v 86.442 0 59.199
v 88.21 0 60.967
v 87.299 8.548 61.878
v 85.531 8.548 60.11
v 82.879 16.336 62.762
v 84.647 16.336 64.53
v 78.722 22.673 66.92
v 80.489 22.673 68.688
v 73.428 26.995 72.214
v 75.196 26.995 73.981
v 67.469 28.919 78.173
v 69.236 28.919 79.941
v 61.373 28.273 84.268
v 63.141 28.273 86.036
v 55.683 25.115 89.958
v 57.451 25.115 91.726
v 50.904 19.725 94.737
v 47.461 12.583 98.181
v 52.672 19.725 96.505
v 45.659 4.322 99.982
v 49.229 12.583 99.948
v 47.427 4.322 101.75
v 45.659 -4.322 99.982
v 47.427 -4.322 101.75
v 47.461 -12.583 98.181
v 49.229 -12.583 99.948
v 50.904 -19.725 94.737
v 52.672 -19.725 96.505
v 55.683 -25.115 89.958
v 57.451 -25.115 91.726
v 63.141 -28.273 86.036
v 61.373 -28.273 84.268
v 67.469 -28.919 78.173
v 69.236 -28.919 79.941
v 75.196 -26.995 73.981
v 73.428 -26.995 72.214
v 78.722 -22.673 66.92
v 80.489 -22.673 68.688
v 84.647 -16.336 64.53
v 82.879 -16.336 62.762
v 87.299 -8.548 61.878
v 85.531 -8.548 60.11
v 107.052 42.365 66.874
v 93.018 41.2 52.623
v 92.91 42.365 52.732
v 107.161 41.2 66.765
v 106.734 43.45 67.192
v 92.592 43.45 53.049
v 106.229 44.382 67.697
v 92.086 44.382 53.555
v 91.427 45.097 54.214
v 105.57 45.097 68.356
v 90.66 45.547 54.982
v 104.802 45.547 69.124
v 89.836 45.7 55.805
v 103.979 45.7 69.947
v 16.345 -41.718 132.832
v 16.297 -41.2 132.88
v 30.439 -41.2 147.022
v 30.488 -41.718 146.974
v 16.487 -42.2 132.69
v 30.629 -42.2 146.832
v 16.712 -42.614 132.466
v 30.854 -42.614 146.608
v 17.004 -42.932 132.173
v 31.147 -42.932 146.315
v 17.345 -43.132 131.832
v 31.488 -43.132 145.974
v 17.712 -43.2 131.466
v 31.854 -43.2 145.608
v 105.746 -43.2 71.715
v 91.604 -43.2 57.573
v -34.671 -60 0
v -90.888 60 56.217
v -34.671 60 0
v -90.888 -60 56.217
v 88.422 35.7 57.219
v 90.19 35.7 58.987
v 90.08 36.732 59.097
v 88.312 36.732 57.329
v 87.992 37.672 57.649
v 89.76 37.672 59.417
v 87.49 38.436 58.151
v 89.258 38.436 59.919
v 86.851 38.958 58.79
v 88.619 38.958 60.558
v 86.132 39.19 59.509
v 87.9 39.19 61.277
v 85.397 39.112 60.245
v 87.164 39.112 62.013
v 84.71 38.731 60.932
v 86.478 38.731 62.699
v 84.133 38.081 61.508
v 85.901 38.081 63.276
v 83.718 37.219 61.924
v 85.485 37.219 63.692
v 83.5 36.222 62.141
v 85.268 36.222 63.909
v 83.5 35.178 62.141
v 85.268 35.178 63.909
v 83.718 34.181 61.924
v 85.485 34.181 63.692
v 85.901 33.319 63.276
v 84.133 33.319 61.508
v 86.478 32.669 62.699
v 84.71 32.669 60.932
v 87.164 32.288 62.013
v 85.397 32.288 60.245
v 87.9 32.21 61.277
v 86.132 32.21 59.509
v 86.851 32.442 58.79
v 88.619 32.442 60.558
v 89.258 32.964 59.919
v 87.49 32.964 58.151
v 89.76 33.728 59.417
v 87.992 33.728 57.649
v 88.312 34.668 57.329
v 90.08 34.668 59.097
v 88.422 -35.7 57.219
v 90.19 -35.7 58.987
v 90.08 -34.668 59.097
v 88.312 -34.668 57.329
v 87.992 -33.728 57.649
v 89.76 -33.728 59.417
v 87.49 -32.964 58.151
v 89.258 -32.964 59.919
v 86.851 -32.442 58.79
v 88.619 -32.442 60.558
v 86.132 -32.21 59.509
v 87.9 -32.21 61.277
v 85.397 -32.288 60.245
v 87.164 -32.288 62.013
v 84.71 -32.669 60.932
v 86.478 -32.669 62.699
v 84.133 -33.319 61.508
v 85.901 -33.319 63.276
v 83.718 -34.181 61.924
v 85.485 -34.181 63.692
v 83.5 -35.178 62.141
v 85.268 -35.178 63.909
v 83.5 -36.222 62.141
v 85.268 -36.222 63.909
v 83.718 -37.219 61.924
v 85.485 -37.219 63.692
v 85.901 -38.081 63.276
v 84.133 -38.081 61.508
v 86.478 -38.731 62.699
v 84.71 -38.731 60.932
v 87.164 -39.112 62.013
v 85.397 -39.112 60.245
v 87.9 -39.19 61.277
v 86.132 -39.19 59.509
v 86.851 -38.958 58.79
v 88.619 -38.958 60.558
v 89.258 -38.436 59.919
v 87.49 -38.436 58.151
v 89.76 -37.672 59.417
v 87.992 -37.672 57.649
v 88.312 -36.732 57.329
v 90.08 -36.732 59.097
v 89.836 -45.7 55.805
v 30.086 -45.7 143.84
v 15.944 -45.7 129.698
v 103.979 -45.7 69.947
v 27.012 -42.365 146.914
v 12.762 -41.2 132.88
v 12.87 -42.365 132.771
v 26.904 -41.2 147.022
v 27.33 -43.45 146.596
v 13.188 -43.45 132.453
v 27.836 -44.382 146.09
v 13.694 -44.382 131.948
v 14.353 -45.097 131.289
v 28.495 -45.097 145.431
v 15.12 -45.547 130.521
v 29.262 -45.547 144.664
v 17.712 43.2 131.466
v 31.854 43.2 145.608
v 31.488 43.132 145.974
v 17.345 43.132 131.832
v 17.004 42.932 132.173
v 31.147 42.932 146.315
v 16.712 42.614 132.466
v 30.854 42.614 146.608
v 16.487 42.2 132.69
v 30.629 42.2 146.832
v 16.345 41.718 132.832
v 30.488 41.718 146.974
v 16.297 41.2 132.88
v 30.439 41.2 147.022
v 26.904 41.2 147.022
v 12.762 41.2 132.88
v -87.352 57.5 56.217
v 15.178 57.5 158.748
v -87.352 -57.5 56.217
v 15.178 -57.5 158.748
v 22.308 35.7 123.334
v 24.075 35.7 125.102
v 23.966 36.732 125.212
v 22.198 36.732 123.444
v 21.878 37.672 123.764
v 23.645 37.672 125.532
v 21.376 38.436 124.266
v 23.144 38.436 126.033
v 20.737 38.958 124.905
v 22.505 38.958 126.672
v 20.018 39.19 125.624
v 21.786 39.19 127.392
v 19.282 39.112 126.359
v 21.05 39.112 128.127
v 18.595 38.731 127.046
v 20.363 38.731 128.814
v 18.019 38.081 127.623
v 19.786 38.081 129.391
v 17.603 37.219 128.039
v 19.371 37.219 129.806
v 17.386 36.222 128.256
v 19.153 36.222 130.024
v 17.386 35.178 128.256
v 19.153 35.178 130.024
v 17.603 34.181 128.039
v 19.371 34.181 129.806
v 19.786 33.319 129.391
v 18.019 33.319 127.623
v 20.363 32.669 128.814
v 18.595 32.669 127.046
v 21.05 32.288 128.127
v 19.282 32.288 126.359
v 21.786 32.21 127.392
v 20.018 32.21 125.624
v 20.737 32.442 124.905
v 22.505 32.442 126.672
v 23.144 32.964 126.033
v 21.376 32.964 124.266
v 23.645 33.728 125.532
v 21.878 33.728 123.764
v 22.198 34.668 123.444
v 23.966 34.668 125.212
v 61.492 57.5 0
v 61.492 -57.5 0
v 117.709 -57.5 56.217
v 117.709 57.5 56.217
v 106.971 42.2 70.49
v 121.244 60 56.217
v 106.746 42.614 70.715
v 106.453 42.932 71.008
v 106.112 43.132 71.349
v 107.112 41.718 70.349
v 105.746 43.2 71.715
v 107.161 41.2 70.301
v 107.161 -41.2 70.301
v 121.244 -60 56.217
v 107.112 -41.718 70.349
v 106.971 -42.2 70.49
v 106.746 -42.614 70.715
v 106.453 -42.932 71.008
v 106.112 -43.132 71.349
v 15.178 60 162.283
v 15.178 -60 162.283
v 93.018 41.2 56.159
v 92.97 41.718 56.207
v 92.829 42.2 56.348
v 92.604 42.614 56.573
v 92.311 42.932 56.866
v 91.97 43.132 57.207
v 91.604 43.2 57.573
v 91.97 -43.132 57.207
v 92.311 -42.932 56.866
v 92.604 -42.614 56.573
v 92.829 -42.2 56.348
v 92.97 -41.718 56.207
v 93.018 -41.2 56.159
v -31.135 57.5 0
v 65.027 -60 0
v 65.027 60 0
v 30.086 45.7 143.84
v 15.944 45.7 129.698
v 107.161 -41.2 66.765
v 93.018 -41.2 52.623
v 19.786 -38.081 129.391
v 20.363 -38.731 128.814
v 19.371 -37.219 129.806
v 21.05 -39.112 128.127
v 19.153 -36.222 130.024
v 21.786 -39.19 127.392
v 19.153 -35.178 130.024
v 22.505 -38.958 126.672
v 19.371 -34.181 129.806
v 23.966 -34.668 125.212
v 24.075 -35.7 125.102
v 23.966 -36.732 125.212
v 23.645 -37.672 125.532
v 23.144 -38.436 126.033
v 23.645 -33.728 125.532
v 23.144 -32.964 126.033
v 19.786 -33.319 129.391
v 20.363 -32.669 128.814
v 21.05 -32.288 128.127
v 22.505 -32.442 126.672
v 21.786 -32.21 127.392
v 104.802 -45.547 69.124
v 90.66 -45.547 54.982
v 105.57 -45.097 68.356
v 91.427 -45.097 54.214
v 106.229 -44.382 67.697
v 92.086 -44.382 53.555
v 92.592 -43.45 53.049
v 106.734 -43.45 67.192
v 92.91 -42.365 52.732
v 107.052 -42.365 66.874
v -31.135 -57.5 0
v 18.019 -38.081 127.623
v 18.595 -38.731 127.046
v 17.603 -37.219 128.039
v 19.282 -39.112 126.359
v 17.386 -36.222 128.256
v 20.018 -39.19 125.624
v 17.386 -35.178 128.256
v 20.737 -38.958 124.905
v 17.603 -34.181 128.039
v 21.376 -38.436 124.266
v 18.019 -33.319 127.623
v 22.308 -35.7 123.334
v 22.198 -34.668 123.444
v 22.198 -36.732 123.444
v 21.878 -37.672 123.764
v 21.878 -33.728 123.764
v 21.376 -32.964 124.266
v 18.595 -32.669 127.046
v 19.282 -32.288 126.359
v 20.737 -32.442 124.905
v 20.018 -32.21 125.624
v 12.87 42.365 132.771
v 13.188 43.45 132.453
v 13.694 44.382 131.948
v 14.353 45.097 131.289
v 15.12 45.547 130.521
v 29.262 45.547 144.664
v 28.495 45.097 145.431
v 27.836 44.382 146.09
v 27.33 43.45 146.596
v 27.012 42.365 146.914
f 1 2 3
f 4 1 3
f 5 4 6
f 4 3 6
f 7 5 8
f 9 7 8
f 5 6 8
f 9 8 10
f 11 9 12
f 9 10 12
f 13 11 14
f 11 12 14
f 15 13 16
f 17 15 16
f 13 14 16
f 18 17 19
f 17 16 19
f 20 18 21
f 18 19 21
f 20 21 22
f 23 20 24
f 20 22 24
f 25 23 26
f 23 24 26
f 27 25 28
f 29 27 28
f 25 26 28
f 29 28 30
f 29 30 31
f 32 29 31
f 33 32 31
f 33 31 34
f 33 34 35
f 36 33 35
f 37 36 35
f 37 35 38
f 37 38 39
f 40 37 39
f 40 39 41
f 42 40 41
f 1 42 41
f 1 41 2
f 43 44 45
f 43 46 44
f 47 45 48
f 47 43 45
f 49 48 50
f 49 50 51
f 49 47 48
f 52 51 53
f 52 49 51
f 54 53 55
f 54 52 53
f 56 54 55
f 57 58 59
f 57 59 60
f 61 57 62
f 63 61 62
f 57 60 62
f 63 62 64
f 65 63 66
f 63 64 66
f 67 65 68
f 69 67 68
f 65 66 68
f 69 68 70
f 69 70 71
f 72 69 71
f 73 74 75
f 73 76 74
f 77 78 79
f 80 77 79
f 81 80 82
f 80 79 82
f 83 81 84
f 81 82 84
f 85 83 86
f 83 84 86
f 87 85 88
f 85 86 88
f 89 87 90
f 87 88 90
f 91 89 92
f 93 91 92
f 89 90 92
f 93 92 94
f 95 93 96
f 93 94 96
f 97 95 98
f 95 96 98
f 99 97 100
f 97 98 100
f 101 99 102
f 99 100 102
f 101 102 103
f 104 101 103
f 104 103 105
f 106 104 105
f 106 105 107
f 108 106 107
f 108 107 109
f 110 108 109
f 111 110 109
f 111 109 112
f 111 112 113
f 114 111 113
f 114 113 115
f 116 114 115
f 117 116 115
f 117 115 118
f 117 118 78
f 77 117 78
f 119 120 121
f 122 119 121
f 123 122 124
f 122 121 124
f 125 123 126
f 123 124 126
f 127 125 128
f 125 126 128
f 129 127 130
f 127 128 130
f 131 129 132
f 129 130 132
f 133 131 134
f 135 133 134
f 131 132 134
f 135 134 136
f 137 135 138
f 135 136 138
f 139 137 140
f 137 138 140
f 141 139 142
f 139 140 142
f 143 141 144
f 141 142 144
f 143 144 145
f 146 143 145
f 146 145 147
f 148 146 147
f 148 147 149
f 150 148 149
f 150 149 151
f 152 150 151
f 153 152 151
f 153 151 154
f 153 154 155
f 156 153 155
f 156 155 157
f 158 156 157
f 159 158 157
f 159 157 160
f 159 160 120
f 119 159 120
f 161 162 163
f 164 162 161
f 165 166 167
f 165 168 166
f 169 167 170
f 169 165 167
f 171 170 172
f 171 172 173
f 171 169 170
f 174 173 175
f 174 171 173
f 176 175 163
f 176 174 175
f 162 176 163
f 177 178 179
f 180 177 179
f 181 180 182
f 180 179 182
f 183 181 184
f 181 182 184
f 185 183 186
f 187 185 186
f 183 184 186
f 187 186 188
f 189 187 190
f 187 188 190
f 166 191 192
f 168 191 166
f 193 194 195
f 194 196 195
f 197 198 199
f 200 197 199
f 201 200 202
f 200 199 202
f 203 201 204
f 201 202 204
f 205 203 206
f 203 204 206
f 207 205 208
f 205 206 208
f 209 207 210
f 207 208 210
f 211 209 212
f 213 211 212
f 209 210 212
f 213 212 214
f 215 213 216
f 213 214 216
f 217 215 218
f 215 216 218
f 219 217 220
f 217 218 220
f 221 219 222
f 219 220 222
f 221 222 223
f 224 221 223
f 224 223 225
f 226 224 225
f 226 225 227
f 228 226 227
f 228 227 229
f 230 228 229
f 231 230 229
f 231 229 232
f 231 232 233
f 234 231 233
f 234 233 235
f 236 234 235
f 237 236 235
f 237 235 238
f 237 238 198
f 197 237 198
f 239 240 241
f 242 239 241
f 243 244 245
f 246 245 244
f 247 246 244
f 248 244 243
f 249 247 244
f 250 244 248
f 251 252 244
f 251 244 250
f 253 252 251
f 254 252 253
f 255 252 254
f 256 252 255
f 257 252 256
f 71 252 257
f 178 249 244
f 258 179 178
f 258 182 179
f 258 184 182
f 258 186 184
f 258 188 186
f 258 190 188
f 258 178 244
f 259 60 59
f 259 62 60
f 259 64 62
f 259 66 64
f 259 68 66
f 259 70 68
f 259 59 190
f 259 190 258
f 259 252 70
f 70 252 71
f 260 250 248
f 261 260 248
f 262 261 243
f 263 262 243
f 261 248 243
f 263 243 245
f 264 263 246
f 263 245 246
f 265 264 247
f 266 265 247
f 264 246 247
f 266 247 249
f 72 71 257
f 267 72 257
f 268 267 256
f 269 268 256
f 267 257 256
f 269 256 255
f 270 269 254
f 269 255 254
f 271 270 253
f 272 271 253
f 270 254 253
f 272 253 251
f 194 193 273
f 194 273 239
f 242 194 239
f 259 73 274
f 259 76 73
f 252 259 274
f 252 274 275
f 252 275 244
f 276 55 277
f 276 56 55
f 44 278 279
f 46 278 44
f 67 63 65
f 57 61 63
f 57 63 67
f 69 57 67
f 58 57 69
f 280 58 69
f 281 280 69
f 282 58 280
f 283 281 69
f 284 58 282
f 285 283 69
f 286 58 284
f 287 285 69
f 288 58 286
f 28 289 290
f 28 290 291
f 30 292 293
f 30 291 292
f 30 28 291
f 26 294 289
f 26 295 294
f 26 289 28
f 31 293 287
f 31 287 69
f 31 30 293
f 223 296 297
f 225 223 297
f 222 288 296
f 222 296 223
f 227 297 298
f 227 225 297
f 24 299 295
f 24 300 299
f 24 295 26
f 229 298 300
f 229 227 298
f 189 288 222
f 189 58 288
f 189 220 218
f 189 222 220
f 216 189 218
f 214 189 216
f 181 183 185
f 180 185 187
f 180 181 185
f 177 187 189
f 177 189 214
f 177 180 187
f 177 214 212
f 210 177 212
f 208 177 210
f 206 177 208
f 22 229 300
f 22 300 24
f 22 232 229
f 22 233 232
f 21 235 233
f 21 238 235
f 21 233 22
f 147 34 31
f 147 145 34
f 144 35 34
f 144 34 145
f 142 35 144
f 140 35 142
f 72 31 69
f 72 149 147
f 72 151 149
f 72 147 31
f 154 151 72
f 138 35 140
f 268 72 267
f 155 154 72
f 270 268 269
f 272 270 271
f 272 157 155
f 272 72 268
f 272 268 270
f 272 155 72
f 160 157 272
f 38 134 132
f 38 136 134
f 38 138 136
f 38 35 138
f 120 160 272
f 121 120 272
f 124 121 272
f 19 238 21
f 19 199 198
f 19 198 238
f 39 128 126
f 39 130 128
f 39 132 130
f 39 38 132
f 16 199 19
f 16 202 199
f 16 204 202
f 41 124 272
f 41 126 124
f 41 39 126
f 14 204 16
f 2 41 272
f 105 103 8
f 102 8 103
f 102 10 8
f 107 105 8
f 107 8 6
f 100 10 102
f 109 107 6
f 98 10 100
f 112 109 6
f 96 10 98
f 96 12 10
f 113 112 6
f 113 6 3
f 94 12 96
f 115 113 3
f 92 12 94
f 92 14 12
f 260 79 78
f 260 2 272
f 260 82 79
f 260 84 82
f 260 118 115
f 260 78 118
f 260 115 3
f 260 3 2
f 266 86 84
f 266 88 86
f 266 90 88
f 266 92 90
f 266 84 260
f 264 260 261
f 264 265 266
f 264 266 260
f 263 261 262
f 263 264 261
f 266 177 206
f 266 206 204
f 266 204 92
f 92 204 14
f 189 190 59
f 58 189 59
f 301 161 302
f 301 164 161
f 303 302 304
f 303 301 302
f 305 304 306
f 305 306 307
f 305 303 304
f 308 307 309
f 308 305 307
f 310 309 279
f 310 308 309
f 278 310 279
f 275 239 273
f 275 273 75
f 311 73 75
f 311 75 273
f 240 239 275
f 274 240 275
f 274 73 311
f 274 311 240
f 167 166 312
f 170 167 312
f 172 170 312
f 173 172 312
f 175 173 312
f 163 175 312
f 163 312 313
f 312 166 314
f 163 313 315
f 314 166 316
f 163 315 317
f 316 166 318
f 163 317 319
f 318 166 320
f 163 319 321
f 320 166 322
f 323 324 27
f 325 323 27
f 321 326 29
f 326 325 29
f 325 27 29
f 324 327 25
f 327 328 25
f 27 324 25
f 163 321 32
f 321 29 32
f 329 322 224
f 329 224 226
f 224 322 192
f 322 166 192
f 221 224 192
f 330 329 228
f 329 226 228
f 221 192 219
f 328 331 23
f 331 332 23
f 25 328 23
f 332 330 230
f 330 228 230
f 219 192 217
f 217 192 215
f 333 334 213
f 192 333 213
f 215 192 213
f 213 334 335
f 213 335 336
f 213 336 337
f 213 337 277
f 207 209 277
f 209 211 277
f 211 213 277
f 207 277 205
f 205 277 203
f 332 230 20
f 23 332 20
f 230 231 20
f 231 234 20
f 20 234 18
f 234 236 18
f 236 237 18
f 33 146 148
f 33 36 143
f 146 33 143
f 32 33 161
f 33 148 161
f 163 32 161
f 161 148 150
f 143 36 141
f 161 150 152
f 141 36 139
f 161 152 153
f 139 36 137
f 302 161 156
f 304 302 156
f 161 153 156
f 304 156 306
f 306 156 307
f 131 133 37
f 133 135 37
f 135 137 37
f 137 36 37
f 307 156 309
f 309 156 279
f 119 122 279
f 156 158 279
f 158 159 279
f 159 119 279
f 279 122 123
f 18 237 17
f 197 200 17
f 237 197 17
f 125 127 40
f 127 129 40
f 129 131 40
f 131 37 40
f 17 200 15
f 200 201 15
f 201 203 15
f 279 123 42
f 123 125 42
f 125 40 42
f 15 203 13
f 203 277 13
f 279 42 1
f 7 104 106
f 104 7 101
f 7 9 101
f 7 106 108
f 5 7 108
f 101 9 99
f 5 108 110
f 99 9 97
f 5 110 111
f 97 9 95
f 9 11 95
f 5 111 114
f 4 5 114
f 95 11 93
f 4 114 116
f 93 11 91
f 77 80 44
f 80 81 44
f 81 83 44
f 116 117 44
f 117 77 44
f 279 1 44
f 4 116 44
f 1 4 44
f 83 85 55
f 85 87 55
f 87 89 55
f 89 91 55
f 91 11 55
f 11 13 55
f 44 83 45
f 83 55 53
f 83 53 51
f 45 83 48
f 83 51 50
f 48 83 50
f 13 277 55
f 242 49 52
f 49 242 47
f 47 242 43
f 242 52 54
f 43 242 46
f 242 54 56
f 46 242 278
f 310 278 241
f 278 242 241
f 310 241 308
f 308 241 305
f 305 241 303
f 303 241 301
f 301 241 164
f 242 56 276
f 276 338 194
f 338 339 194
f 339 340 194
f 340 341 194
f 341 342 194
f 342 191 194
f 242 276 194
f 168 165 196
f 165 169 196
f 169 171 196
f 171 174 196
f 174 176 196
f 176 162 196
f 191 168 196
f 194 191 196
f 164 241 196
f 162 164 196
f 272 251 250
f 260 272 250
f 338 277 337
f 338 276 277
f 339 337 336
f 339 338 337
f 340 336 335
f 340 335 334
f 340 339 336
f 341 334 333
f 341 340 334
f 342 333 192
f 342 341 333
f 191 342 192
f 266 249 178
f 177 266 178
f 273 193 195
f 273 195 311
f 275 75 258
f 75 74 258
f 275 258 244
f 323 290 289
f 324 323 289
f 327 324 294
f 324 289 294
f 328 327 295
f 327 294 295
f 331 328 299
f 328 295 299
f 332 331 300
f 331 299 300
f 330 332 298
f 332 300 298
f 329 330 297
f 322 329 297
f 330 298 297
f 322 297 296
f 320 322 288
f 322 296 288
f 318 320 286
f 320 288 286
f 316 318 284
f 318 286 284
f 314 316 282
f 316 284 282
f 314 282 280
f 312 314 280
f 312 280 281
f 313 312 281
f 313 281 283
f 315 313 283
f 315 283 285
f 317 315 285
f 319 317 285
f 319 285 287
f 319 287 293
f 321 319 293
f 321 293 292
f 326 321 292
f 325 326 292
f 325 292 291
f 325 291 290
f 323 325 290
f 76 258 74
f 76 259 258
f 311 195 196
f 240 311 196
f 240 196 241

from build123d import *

# Parameters (mm, degrees)
F1_DEPTH = 60
F2_R     = 3.5
F2_R_2   = 29
F3_DEPTH = 20
F4_T     = -2.5
F5_DEPTH = 40


with BuildPart() as f1:
    # F0 (on Front) → F1 (new body, symmetric)
    with BuildSketch(Plane.XZ):
        Polygon((-34.6706601963, 0), (65.0272384259, 0), (121.2443062928, 56.2170678669), (15.1782891148, 162.2830850448), (-90.8877280632, 56.2170678669), align=None)
    extrude(amount=F1_DEPTH, both=True)

    # F2 (on face) → F3 (cut)
    with BuildSketch(Plane(origin=(88.7306870798, 0, 88.7306870798), x_dir=(0.7071067812, 0, -0.7071067812), z_dir=(0.7071067812, 0, 0.7071067812))):
        with BuildLine():
            ThreePointArc((26.0637215376, 41.2), (25.4779351, 42.6142135624), (24.0637215376, 43.2))
            Line((24.0637215376, 43.2), (-80.4362784624, 43.2))
            ThreePointArc((-80.4362784624, 43.2), (-81.8504920248, 42.6142135624), (-82.4362784624, 41.2))
            Line((-82.4362784624, 41.2), (-82.4362784624, -41.2))
            ThreePointArc((-82.4362784624, -41.2), (-81.8504920248, -42.6142135624), (-80.4362784624, -43.2))
            Line((-80.4362784624, -43.2), (24.0637215376, -43.2))
            ThreePointArc((24.0637215376, -43.2), (25.4779351, -42.6142135624), (26.0637215376, -41.2))
            Line((26.0637215376, -41.2), (26.0637215376, 41.2))
        make_face()
        with Locations((-74.9362784624, -35.7)):
            Circle(F2_R, mode=Mode.SUBTRACT)
        with Locations((18.5637215376, -35.7)):
            Circle(F2_R, mode=Mode.SUBTRACT)
        with Locations((-74.9362784624, 35.7)):
            Circle(F2_R, mode=Mode.SUBTRACT)
        with Locations((-9.7362784624, 0)):
            Circle(F2_R_2, mode=Mode.SUBTRACT)
        with Locations((18.5637215376, 35.7)):
            Circle(F2_R, mode=Mode.SUBTRACT)
        with Locations((-9.7362784624, 0)):
            Circle(F2_R_2)
        with Locations((-74.9362784624, -35.7)):
            Circle(F2_R)
        with Locations((-74.9362784624, 35.7)):
            Circle(F2_R)
        with Locations((18.5637215376, 35.7)):
            Circle(F2_R)
        with Locations((18.5637215376, -35.7)):
            Circle(F2_R)
    extrude(amount=-F3_DEPTH, mode=Mode.SUBTRACT)

    # F4
    f4_openings = [f1.faces().sort_by_distance(p)[0] for p in [
        (15.178289, 0, 0),
    ]]
    offset(amount=F4_T, openings=f4_openings, kind=Kind.INTERSECTION)

    # F2 (on face) → F5 (cut)
    with BuildSketch(Plane(origin=(88.7306870798, 0, 88.7306870798), x_dir=(0.7071067812, 0, -0.7071067812), z_dir=(0.7071067812, 0, 0.7071067812))):
        with Locations((-9.7362784624, 0)):
            Circle(F2_R_2)
        with Locations((-74.9362784624, 35.7)):
            Circle(F2_R)
        with Locations((-74.9362784624, -35.7)):
            Circle(F2_R)
        with Locations((18.5637215376, -35.7)):
            Circle(F2_R)
        with Locations((18.5637215376, 35.7)):
            Circle(F2_R)
    extrude(amount=-F5_DEPTH, mode=Mode.SUBTRACT)


solid = f1.part
